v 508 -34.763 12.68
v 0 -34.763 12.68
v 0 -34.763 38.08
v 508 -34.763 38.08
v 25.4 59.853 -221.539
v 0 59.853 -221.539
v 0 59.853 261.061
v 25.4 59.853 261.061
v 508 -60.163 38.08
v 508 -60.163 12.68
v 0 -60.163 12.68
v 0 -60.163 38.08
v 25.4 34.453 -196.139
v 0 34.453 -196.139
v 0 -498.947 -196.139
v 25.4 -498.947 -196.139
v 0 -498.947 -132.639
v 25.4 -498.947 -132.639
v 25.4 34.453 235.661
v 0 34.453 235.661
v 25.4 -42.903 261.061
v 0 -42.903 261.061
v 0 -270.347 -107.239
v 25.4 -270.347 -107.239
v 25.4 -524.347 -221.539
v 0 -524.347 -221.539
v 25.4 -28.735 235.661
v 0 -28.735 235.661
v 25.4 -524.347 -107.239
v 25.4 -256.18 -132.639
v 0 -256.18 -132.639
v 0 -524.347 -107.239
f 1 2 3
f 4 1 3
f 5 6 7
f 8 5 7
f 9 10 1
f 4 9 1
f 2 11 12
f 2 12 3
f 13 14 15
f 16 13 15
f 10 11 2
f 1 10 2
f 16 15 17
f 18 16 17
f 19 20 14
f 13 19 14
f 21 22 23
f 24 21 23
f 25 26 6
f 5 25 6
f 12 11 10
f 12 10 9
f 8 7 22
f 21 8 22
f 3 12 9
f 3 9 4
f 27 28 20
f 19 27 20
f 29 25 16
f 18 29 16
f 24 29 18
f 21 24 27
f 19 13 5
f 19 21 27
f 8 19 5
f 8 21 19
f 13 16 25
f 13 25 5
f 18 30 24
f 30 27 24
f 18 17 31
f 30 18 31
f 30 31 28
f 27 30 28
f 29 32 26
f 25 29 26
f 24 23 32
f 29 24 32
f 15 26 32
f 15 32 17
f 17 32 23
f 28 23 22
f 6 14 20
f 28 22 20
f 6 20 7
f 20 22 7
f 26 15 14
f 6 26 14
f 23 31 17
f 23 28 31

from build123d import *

# Parameters (mm, degrees)
F1_DEPTH = 25.4
F2_W     = 25.4
F2_H     = 25.4
F3_DEPTH = 508


with BuildPart() as f1:
    # F0 (on Right) → F1 (new body)
    with BuildSketch(Plane.YZ):
        Polygon((34.453054, 235.660777), (59.853054, 261.060777), (-42.902501, 261.060777), (-28.735267, 235.660777), align=None)
        Polygon((-28.735267, 235.660777), (-42.902501, 261.060777), (-270.346946, -107.239223), (-256.179712, -132.639223), align=None)
        Polygon((-256.179712, -132.639223), (-270.346946, -107.239223), (-524.346946, -107.239223), (-498.946946, -132.639223), align=None)
        Polygon((-524.346946, -107.239223), (-524.346946, -221.539223), (-498.946946, -196.139223), (-498.946946, -132.639223), align=None)
        Polygon((-524.346946, -221.539223), (59.853054, -221.539223), (34.453054, -196.139223), (-498.946946, -196.139223), align=None)
        Polygon((59.853054, -221.539223), (59.853054, 261.060777), (34.453054, 235.660777), (34.453054, -196.139223), align=None)
    extrude(amount=F1_DEPTH)


with BuildPart() as f3:
    # F2 (on Right) → F3 (new body)
    with BuildSketch(Plane.YZ):
        with Locations((-47.463216, 25.379922)):
            Rectangle(F2_W, F2_H)
    extrude(amount=F3_DEPTH)


solid = Compound([f1.part, f3.part])
